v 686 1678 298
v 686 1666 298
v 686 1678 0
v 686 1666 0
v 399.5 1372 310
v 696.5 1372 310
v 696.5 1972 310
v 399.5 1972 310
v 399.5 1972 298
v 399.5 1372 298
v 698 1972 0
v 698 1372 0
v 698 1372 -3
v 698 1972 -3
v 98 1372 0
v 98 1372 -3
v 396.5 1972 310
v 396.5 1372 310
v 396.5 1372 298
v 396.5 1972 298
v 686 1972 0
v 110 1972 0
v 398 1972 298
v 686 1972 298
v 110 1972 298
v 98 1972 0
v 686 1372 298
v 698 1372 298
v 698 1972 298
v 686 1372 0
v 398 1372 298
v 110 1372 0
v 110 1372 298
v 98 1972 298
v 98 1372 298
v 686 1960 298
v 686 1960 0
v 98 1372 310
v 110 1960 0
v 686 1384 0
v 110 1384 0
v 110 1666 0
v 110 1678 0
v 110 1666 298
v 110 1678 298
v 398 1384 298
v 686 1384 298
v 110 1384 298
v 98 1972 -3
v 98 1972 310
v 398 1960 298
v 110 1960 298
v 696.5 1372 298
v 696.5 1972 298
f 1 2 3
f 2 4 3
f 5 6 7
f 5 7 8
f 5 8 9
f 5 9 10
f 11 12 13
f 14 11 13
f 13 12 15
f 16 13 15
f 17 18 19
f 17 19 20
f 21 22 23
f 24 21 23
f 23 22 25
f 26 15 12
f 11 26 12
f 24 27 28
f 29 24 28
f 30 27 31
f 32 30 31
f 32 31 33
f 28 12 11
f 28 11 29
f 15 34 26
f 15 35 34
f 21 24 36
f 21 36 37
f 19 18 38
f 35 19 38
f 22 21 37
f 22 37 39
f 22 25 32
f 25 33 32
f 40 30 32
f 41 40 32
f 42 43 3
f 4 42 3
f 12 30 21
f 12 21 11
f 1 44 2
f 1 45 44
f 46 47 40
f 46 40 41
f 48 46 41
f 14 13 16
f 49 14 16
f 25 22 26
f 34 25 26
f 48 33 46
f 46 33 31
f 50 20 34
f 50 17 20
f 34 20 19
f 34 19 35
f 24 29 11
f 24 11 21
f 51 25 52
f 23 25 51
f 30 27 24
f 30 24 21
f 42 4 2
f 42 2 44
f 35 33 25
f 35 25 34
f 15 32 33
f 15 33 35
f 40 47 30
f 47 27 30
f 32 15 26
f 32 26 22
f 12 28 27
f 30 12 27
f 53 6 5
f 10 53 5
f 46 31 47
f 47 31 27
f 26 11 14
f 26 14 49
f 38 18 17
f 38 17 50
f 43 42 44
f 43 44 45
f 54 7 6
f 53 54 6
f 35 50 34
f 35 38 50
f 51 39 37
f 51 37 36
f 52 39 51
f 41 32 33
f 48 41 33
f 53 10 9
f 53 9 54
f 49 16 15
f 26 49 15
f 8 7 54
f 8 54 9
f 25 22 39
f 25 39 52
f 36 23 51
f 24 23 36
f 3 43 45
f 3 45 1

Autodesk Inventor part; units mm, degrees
ref_plane "YZ Plane" through (0, 0, 0) normal (1, 0, 0) x (0, 1, 0)
sketch "Sketch1" plane through (0, 0, 0) normal (0, 0, 1) x (1, 0, 0)
  line L0 (-1498, 0) -> (1498, 0) construction
  line L1 (-1498, 0) -> (-898, 0)
  line L2 (-898, 0) -> (-898, 2068)
  line L3 (-898, 2068) -> (-1498, 2068)
  line L4 (-1498, 2068) -> (-1498, 0)
  line L5 (-898, 0) -> (-498, 0)
  line L6 (-498, 0) -> (-498, 816)
  line L7 (-498, 816) -> (-898, 816)
  line L8 (-898, 816) -> (-898, 0)
  line L9 (-498, 0) -> (102, 0)
  line L10 (102, 0) -> (102, 816)
  line L11 (102, 816) -> (-498, 816)
  line L12 (-498, 816) -> (-498, 0)
  line L13 (102, 0) -> (698, 0)
  line L14 (698, 0) -> (698, 668)
  line L15 (698, 668) -> (102, 668)
  line L16 (102, 668) -> (102, 0)
  line L17 (698, 0) -> (1498, 0)
  line L18 (1498, 0) -> (1498, 816)
  line L19 (1498, 816) -> (698, 816)
  line L20 (698, 816) -> (698, 0)
  line L21 (-1498, 0) -> (1498, 0)
  line L22 (1498, 0) -> (1498, 96)
  line L23 (1498, 96) -> (-1498, 96)
  line L24 (-1498, 96) -> (-1498, 0)
  line L25 (-898, 816) -> (1498, 816)
  line L26 (1498, 816) -> (1498, 832)
  line L27 (1498, 832) -> (-898, 832)
  line L28 (-898, 832) -> (-898, 816)
  line L29 (-898, 1972) -> (-498, 1972)
  line L30 (-498, 1972) -> (-498, 1372)
  line L31 (-498, 1372) -> (-898, 1372)
  line L32 (-898, 1372) -> (-898, 1972)
  line L33 (698, 1972) -> (1498, 1972)
  line L34 (1498, 1972) -> (1498, 1372)
  line L35 (1498, 1372) -> (698, 1372)
  line L36 (698, 1372) -> (698, 1972)
  line L37 (698, 1372) -> (98, 1372)
  line L38 (98, 1372) -> (98, 1972)
  line L39 (98, 1972) -> (698, 1972)
  line L40 (698, 1972) -> (698, 1372)
  line L41 (-498, 1372) -> (98, 1372)
  line L42 (-498, 1372) -> (-275, 1637.7611)
  line L43 (98, 1372) -> (-125, 1637.7611)
  line L44 (-275, 1637.7611) -> (-125, 1637.7611)
  line L45 (-125, 1637.7611) -> (-125, 2068)
  line L46 (-125, 2068) -> (-275, 2068)
  line L47 (-275, 2068) -> (-275, 1637.7611)
  line L48 (1098, 816) -> (1098, 96)
  line L49 (-198, 816) -> (-198, 96)
  line L50 (-898, 668) -> (-498, 668)
  line L51 (-1498, 520) -> (-898, 520)
  line L52 (-1498, 1579) -> (-898, 1579)
  line L53 (398, 1972) -> (398, 1372)
  line L54 (1098, 1972) -> (1098, 1372)
  line L55 (698, 1876) -> (1498, 1876)
  line L56 (698, 1468) -> (1498, 1468)
  line L57 (-1498, 1049.5) -> (-898, 1049.5)
  point P0 (0, 0)
  point P1 (0, 0)
  point P2 (0, 0)
  point P3 (1098, 816)
  point P4 (-198, 816)
  point P5 (0, 0)
  dimension "d0" = 2996
  dimension "d1" = 600
  dimension "d2" = 2068
  dimension "d3" = 400
  dimension "d4" = 816
  dimension "d5" = 600
  dimension "d6" = 816
  dimension "d7" = 596
  dimension "d8" = 668
  dimension "d9" = 800
  dimension "d10" = 816
  dimension "d11" = 96
  dimension "d12" = 16
  dimension "d13" = 400
  dimension "d14" = 600
  dimension "d15" = 96
  dimension "d16" = 800
  dimension "d17" = 600
  dimension "d18" = 600
  dimension "d19" = 600
  dimension "d20" = 50
  dimension "d21" = 150
  dimension "d22" = 148
  dimension "d23" = 1059
  dimension "d24" = 96
  dimension "d25" = 96
  dimension "d26" = 529.5
ref_plane "Work Plane1" through (698, 1372, 0) normal (0, 1, 0) x (-1, 0, 0)
sketch "Sketch2" plane through (698, 1372, 0) normal (0, 1, 0) x (-1, 0, 0)
  line L0 (600, 0) -> (0, 0)
  line L1 (0, 0) -> (0, 310)
  line L2 (0, 310) -> (600, 310)
  line L3 (600, 310) -> (600, 0)
  line L4 (588, 298) -> (12, 298)
  line L5 (12, 298) -> (12, 12)
  line L6 (12, 12) -> (588, 12)
  line L7 (588, 12) -> (588, 298)
  line L8 (588, 12) -> (588, 0)
  line L9 (12, 12) -> (12, 0)
  line L10 (12, 298) -> (0, 298)
  line L11 (588, 298) -> (600, 298)
  point P0 (698, 0)
  point P1 (600, 0)
  point P2 (0, 0)
  point P3 (0, 0)
  dimension "d28" = 600
  dimension "d29" = 310
  dimension "d30" = 12
extrude "Extrusion1" add sketch "Sketch2" along normal up to surface (600 mm away) contours L0 L8 L7 L11 L3 | L0 L1 L10 L5 L9
extrude "Extrusion2" add sketch "Sketch2" along normal up to surface (600 mm away) separate body contours L11 L4 L10 L1 L2 L3
split body "Split1" sketch "Sketch1" result two bodies bodies 2 curves L53 first body at (498, 1572, 309.5)
sketch "Sketch3" plane through (698, 1372, 0) normal (0, 1, 0) x (-1, 0, 0)
  line L0 (600, 0) -> (600, 298) projected
  line L1 (600, 0) -> (0, 0)
  line L2 (0, 0) -> (0, -3)
  line L3 (0, -3) -> (600, -3)
  line L4 (600, -3) -> (600, 0)
  point P0 (698, 0)
  dimension "d35" = 3
extrude "Extrusion3" add sketch "Sketch3" along normal up to surface (600 mm away) separate body
sketch "Sketch4" plane through (698, 1372, 0) normal (0, 1, 0) x (-1, 0, 0)
  line L0 (0, 0) -> (600, 0) projected
  line L1 (588, 0) -> (588, 298) projected
  line L2 (12, 298) -> (12, 0) projected
  line L3 (300, 298) -> (0, 298) projected
  line L4 (600, 298) -> (300, 298) projected
  point P0 (698, 0)
extrude "Extrusion4" add sketch "Sketch4" along normal blind 12 separate body
ref_plane "Work Plane2" through (698, 1972, 223.5) normal (0, -1, 0) x (0, 0, 1)
sketch "Sketch5" plane through (698, 1972, 223.5) normal (0, -1, 0) x (0, 0, 1)
  line L0 (-223.5, 0) -> (-223.5, 600) projected
  line L1 (-223.5, 588) -> (74.5, 588) projected
  line L2 (74.5, 12) -> (-223.5, 12) projected
  line L3 (74.5, 300) -> (74.5, 0) projected
  line L4 (74.5, 600) -> (74.5, 300) projected
  point P0 (-223.5, 698)
extrude "Extrusion5" add sketch "Sketch5" along normal blind 12 separate body
sketch "Sketch6" plane through (698, 1372, 310) normal (0, 0, 1) x (1, 0, 0)
  line L0 (-600, 600) -> (-300, 600) projected
  line L1 (0, 0) -> (-300, 0) projected
  line L2 (-301.5, 600) -> (-298.5, 600)
  line L3 (-298.5, 600) -> (-298.5, 0)
  line L4 (-298.5, 0) -> (-301.5, 0)
  line L5 (-301.5, 0) -> (-301.5, 600)
  line L6 (-300, 0) -> (-300, 600) projected
  point P0 (-698, -1372)
  dimension "d42" = 1.5
  dimension "d43" = 1.5
extrude "Extrusion6" cut sketch "Sketch6" against normal blind 12 bodies 4 3
sketch "Sketch7" plane through (98, 1372, 0) normal (0, 0, 1) x (1, 0, 0)
  line L0 (12, 0) -> (12, 600) projected
  line L1 (588, 0) -> (588, 600) projected
  line L2 (12, 306) -> (588, 306)
  line L3 (588, 306) -> (588, 294)
  line L4 (588, 294) -> (12, 294)
  line L5 (12, 294) -> (12, 306)
  line L6 (12, 12) -> (588, 12) projected
  point P0 (-98, -1372)
  point P1 (12, 294)
  dimension "d46" = 282
  dimension "d47" = 12
extrude "Extrusion7" add sketch "Sketch7" along normal up to surface (298 mm away) separate body contours L0 L2 L1 L4
sketch "Sketch8" plane through (698, 1372, 310) normal (0, 0, 1) x (1, 0, 0)
  line L0 (0, 600) -> (-298.5, 600) projected
  line L1 (0, 0) -> (-298.5, 0) projected
  line L2 (0, 600) -> (-1.5, 600)
  line L3 (-1.5, 600) -> (-1.5, 0)
  line L4 (-1.5, 0) -> (0, 0)
  line L5 (0, 0) -> (0, 600)
  point P0 (-698, -1372)
  point P1 (-1.5, 600)
  dimension "d50" = 1.5
extrude "Extrusion8" cut sketch "Sketch8" against normal blind 12 bodies 3
properties part number "Wall Cabinet 2"
